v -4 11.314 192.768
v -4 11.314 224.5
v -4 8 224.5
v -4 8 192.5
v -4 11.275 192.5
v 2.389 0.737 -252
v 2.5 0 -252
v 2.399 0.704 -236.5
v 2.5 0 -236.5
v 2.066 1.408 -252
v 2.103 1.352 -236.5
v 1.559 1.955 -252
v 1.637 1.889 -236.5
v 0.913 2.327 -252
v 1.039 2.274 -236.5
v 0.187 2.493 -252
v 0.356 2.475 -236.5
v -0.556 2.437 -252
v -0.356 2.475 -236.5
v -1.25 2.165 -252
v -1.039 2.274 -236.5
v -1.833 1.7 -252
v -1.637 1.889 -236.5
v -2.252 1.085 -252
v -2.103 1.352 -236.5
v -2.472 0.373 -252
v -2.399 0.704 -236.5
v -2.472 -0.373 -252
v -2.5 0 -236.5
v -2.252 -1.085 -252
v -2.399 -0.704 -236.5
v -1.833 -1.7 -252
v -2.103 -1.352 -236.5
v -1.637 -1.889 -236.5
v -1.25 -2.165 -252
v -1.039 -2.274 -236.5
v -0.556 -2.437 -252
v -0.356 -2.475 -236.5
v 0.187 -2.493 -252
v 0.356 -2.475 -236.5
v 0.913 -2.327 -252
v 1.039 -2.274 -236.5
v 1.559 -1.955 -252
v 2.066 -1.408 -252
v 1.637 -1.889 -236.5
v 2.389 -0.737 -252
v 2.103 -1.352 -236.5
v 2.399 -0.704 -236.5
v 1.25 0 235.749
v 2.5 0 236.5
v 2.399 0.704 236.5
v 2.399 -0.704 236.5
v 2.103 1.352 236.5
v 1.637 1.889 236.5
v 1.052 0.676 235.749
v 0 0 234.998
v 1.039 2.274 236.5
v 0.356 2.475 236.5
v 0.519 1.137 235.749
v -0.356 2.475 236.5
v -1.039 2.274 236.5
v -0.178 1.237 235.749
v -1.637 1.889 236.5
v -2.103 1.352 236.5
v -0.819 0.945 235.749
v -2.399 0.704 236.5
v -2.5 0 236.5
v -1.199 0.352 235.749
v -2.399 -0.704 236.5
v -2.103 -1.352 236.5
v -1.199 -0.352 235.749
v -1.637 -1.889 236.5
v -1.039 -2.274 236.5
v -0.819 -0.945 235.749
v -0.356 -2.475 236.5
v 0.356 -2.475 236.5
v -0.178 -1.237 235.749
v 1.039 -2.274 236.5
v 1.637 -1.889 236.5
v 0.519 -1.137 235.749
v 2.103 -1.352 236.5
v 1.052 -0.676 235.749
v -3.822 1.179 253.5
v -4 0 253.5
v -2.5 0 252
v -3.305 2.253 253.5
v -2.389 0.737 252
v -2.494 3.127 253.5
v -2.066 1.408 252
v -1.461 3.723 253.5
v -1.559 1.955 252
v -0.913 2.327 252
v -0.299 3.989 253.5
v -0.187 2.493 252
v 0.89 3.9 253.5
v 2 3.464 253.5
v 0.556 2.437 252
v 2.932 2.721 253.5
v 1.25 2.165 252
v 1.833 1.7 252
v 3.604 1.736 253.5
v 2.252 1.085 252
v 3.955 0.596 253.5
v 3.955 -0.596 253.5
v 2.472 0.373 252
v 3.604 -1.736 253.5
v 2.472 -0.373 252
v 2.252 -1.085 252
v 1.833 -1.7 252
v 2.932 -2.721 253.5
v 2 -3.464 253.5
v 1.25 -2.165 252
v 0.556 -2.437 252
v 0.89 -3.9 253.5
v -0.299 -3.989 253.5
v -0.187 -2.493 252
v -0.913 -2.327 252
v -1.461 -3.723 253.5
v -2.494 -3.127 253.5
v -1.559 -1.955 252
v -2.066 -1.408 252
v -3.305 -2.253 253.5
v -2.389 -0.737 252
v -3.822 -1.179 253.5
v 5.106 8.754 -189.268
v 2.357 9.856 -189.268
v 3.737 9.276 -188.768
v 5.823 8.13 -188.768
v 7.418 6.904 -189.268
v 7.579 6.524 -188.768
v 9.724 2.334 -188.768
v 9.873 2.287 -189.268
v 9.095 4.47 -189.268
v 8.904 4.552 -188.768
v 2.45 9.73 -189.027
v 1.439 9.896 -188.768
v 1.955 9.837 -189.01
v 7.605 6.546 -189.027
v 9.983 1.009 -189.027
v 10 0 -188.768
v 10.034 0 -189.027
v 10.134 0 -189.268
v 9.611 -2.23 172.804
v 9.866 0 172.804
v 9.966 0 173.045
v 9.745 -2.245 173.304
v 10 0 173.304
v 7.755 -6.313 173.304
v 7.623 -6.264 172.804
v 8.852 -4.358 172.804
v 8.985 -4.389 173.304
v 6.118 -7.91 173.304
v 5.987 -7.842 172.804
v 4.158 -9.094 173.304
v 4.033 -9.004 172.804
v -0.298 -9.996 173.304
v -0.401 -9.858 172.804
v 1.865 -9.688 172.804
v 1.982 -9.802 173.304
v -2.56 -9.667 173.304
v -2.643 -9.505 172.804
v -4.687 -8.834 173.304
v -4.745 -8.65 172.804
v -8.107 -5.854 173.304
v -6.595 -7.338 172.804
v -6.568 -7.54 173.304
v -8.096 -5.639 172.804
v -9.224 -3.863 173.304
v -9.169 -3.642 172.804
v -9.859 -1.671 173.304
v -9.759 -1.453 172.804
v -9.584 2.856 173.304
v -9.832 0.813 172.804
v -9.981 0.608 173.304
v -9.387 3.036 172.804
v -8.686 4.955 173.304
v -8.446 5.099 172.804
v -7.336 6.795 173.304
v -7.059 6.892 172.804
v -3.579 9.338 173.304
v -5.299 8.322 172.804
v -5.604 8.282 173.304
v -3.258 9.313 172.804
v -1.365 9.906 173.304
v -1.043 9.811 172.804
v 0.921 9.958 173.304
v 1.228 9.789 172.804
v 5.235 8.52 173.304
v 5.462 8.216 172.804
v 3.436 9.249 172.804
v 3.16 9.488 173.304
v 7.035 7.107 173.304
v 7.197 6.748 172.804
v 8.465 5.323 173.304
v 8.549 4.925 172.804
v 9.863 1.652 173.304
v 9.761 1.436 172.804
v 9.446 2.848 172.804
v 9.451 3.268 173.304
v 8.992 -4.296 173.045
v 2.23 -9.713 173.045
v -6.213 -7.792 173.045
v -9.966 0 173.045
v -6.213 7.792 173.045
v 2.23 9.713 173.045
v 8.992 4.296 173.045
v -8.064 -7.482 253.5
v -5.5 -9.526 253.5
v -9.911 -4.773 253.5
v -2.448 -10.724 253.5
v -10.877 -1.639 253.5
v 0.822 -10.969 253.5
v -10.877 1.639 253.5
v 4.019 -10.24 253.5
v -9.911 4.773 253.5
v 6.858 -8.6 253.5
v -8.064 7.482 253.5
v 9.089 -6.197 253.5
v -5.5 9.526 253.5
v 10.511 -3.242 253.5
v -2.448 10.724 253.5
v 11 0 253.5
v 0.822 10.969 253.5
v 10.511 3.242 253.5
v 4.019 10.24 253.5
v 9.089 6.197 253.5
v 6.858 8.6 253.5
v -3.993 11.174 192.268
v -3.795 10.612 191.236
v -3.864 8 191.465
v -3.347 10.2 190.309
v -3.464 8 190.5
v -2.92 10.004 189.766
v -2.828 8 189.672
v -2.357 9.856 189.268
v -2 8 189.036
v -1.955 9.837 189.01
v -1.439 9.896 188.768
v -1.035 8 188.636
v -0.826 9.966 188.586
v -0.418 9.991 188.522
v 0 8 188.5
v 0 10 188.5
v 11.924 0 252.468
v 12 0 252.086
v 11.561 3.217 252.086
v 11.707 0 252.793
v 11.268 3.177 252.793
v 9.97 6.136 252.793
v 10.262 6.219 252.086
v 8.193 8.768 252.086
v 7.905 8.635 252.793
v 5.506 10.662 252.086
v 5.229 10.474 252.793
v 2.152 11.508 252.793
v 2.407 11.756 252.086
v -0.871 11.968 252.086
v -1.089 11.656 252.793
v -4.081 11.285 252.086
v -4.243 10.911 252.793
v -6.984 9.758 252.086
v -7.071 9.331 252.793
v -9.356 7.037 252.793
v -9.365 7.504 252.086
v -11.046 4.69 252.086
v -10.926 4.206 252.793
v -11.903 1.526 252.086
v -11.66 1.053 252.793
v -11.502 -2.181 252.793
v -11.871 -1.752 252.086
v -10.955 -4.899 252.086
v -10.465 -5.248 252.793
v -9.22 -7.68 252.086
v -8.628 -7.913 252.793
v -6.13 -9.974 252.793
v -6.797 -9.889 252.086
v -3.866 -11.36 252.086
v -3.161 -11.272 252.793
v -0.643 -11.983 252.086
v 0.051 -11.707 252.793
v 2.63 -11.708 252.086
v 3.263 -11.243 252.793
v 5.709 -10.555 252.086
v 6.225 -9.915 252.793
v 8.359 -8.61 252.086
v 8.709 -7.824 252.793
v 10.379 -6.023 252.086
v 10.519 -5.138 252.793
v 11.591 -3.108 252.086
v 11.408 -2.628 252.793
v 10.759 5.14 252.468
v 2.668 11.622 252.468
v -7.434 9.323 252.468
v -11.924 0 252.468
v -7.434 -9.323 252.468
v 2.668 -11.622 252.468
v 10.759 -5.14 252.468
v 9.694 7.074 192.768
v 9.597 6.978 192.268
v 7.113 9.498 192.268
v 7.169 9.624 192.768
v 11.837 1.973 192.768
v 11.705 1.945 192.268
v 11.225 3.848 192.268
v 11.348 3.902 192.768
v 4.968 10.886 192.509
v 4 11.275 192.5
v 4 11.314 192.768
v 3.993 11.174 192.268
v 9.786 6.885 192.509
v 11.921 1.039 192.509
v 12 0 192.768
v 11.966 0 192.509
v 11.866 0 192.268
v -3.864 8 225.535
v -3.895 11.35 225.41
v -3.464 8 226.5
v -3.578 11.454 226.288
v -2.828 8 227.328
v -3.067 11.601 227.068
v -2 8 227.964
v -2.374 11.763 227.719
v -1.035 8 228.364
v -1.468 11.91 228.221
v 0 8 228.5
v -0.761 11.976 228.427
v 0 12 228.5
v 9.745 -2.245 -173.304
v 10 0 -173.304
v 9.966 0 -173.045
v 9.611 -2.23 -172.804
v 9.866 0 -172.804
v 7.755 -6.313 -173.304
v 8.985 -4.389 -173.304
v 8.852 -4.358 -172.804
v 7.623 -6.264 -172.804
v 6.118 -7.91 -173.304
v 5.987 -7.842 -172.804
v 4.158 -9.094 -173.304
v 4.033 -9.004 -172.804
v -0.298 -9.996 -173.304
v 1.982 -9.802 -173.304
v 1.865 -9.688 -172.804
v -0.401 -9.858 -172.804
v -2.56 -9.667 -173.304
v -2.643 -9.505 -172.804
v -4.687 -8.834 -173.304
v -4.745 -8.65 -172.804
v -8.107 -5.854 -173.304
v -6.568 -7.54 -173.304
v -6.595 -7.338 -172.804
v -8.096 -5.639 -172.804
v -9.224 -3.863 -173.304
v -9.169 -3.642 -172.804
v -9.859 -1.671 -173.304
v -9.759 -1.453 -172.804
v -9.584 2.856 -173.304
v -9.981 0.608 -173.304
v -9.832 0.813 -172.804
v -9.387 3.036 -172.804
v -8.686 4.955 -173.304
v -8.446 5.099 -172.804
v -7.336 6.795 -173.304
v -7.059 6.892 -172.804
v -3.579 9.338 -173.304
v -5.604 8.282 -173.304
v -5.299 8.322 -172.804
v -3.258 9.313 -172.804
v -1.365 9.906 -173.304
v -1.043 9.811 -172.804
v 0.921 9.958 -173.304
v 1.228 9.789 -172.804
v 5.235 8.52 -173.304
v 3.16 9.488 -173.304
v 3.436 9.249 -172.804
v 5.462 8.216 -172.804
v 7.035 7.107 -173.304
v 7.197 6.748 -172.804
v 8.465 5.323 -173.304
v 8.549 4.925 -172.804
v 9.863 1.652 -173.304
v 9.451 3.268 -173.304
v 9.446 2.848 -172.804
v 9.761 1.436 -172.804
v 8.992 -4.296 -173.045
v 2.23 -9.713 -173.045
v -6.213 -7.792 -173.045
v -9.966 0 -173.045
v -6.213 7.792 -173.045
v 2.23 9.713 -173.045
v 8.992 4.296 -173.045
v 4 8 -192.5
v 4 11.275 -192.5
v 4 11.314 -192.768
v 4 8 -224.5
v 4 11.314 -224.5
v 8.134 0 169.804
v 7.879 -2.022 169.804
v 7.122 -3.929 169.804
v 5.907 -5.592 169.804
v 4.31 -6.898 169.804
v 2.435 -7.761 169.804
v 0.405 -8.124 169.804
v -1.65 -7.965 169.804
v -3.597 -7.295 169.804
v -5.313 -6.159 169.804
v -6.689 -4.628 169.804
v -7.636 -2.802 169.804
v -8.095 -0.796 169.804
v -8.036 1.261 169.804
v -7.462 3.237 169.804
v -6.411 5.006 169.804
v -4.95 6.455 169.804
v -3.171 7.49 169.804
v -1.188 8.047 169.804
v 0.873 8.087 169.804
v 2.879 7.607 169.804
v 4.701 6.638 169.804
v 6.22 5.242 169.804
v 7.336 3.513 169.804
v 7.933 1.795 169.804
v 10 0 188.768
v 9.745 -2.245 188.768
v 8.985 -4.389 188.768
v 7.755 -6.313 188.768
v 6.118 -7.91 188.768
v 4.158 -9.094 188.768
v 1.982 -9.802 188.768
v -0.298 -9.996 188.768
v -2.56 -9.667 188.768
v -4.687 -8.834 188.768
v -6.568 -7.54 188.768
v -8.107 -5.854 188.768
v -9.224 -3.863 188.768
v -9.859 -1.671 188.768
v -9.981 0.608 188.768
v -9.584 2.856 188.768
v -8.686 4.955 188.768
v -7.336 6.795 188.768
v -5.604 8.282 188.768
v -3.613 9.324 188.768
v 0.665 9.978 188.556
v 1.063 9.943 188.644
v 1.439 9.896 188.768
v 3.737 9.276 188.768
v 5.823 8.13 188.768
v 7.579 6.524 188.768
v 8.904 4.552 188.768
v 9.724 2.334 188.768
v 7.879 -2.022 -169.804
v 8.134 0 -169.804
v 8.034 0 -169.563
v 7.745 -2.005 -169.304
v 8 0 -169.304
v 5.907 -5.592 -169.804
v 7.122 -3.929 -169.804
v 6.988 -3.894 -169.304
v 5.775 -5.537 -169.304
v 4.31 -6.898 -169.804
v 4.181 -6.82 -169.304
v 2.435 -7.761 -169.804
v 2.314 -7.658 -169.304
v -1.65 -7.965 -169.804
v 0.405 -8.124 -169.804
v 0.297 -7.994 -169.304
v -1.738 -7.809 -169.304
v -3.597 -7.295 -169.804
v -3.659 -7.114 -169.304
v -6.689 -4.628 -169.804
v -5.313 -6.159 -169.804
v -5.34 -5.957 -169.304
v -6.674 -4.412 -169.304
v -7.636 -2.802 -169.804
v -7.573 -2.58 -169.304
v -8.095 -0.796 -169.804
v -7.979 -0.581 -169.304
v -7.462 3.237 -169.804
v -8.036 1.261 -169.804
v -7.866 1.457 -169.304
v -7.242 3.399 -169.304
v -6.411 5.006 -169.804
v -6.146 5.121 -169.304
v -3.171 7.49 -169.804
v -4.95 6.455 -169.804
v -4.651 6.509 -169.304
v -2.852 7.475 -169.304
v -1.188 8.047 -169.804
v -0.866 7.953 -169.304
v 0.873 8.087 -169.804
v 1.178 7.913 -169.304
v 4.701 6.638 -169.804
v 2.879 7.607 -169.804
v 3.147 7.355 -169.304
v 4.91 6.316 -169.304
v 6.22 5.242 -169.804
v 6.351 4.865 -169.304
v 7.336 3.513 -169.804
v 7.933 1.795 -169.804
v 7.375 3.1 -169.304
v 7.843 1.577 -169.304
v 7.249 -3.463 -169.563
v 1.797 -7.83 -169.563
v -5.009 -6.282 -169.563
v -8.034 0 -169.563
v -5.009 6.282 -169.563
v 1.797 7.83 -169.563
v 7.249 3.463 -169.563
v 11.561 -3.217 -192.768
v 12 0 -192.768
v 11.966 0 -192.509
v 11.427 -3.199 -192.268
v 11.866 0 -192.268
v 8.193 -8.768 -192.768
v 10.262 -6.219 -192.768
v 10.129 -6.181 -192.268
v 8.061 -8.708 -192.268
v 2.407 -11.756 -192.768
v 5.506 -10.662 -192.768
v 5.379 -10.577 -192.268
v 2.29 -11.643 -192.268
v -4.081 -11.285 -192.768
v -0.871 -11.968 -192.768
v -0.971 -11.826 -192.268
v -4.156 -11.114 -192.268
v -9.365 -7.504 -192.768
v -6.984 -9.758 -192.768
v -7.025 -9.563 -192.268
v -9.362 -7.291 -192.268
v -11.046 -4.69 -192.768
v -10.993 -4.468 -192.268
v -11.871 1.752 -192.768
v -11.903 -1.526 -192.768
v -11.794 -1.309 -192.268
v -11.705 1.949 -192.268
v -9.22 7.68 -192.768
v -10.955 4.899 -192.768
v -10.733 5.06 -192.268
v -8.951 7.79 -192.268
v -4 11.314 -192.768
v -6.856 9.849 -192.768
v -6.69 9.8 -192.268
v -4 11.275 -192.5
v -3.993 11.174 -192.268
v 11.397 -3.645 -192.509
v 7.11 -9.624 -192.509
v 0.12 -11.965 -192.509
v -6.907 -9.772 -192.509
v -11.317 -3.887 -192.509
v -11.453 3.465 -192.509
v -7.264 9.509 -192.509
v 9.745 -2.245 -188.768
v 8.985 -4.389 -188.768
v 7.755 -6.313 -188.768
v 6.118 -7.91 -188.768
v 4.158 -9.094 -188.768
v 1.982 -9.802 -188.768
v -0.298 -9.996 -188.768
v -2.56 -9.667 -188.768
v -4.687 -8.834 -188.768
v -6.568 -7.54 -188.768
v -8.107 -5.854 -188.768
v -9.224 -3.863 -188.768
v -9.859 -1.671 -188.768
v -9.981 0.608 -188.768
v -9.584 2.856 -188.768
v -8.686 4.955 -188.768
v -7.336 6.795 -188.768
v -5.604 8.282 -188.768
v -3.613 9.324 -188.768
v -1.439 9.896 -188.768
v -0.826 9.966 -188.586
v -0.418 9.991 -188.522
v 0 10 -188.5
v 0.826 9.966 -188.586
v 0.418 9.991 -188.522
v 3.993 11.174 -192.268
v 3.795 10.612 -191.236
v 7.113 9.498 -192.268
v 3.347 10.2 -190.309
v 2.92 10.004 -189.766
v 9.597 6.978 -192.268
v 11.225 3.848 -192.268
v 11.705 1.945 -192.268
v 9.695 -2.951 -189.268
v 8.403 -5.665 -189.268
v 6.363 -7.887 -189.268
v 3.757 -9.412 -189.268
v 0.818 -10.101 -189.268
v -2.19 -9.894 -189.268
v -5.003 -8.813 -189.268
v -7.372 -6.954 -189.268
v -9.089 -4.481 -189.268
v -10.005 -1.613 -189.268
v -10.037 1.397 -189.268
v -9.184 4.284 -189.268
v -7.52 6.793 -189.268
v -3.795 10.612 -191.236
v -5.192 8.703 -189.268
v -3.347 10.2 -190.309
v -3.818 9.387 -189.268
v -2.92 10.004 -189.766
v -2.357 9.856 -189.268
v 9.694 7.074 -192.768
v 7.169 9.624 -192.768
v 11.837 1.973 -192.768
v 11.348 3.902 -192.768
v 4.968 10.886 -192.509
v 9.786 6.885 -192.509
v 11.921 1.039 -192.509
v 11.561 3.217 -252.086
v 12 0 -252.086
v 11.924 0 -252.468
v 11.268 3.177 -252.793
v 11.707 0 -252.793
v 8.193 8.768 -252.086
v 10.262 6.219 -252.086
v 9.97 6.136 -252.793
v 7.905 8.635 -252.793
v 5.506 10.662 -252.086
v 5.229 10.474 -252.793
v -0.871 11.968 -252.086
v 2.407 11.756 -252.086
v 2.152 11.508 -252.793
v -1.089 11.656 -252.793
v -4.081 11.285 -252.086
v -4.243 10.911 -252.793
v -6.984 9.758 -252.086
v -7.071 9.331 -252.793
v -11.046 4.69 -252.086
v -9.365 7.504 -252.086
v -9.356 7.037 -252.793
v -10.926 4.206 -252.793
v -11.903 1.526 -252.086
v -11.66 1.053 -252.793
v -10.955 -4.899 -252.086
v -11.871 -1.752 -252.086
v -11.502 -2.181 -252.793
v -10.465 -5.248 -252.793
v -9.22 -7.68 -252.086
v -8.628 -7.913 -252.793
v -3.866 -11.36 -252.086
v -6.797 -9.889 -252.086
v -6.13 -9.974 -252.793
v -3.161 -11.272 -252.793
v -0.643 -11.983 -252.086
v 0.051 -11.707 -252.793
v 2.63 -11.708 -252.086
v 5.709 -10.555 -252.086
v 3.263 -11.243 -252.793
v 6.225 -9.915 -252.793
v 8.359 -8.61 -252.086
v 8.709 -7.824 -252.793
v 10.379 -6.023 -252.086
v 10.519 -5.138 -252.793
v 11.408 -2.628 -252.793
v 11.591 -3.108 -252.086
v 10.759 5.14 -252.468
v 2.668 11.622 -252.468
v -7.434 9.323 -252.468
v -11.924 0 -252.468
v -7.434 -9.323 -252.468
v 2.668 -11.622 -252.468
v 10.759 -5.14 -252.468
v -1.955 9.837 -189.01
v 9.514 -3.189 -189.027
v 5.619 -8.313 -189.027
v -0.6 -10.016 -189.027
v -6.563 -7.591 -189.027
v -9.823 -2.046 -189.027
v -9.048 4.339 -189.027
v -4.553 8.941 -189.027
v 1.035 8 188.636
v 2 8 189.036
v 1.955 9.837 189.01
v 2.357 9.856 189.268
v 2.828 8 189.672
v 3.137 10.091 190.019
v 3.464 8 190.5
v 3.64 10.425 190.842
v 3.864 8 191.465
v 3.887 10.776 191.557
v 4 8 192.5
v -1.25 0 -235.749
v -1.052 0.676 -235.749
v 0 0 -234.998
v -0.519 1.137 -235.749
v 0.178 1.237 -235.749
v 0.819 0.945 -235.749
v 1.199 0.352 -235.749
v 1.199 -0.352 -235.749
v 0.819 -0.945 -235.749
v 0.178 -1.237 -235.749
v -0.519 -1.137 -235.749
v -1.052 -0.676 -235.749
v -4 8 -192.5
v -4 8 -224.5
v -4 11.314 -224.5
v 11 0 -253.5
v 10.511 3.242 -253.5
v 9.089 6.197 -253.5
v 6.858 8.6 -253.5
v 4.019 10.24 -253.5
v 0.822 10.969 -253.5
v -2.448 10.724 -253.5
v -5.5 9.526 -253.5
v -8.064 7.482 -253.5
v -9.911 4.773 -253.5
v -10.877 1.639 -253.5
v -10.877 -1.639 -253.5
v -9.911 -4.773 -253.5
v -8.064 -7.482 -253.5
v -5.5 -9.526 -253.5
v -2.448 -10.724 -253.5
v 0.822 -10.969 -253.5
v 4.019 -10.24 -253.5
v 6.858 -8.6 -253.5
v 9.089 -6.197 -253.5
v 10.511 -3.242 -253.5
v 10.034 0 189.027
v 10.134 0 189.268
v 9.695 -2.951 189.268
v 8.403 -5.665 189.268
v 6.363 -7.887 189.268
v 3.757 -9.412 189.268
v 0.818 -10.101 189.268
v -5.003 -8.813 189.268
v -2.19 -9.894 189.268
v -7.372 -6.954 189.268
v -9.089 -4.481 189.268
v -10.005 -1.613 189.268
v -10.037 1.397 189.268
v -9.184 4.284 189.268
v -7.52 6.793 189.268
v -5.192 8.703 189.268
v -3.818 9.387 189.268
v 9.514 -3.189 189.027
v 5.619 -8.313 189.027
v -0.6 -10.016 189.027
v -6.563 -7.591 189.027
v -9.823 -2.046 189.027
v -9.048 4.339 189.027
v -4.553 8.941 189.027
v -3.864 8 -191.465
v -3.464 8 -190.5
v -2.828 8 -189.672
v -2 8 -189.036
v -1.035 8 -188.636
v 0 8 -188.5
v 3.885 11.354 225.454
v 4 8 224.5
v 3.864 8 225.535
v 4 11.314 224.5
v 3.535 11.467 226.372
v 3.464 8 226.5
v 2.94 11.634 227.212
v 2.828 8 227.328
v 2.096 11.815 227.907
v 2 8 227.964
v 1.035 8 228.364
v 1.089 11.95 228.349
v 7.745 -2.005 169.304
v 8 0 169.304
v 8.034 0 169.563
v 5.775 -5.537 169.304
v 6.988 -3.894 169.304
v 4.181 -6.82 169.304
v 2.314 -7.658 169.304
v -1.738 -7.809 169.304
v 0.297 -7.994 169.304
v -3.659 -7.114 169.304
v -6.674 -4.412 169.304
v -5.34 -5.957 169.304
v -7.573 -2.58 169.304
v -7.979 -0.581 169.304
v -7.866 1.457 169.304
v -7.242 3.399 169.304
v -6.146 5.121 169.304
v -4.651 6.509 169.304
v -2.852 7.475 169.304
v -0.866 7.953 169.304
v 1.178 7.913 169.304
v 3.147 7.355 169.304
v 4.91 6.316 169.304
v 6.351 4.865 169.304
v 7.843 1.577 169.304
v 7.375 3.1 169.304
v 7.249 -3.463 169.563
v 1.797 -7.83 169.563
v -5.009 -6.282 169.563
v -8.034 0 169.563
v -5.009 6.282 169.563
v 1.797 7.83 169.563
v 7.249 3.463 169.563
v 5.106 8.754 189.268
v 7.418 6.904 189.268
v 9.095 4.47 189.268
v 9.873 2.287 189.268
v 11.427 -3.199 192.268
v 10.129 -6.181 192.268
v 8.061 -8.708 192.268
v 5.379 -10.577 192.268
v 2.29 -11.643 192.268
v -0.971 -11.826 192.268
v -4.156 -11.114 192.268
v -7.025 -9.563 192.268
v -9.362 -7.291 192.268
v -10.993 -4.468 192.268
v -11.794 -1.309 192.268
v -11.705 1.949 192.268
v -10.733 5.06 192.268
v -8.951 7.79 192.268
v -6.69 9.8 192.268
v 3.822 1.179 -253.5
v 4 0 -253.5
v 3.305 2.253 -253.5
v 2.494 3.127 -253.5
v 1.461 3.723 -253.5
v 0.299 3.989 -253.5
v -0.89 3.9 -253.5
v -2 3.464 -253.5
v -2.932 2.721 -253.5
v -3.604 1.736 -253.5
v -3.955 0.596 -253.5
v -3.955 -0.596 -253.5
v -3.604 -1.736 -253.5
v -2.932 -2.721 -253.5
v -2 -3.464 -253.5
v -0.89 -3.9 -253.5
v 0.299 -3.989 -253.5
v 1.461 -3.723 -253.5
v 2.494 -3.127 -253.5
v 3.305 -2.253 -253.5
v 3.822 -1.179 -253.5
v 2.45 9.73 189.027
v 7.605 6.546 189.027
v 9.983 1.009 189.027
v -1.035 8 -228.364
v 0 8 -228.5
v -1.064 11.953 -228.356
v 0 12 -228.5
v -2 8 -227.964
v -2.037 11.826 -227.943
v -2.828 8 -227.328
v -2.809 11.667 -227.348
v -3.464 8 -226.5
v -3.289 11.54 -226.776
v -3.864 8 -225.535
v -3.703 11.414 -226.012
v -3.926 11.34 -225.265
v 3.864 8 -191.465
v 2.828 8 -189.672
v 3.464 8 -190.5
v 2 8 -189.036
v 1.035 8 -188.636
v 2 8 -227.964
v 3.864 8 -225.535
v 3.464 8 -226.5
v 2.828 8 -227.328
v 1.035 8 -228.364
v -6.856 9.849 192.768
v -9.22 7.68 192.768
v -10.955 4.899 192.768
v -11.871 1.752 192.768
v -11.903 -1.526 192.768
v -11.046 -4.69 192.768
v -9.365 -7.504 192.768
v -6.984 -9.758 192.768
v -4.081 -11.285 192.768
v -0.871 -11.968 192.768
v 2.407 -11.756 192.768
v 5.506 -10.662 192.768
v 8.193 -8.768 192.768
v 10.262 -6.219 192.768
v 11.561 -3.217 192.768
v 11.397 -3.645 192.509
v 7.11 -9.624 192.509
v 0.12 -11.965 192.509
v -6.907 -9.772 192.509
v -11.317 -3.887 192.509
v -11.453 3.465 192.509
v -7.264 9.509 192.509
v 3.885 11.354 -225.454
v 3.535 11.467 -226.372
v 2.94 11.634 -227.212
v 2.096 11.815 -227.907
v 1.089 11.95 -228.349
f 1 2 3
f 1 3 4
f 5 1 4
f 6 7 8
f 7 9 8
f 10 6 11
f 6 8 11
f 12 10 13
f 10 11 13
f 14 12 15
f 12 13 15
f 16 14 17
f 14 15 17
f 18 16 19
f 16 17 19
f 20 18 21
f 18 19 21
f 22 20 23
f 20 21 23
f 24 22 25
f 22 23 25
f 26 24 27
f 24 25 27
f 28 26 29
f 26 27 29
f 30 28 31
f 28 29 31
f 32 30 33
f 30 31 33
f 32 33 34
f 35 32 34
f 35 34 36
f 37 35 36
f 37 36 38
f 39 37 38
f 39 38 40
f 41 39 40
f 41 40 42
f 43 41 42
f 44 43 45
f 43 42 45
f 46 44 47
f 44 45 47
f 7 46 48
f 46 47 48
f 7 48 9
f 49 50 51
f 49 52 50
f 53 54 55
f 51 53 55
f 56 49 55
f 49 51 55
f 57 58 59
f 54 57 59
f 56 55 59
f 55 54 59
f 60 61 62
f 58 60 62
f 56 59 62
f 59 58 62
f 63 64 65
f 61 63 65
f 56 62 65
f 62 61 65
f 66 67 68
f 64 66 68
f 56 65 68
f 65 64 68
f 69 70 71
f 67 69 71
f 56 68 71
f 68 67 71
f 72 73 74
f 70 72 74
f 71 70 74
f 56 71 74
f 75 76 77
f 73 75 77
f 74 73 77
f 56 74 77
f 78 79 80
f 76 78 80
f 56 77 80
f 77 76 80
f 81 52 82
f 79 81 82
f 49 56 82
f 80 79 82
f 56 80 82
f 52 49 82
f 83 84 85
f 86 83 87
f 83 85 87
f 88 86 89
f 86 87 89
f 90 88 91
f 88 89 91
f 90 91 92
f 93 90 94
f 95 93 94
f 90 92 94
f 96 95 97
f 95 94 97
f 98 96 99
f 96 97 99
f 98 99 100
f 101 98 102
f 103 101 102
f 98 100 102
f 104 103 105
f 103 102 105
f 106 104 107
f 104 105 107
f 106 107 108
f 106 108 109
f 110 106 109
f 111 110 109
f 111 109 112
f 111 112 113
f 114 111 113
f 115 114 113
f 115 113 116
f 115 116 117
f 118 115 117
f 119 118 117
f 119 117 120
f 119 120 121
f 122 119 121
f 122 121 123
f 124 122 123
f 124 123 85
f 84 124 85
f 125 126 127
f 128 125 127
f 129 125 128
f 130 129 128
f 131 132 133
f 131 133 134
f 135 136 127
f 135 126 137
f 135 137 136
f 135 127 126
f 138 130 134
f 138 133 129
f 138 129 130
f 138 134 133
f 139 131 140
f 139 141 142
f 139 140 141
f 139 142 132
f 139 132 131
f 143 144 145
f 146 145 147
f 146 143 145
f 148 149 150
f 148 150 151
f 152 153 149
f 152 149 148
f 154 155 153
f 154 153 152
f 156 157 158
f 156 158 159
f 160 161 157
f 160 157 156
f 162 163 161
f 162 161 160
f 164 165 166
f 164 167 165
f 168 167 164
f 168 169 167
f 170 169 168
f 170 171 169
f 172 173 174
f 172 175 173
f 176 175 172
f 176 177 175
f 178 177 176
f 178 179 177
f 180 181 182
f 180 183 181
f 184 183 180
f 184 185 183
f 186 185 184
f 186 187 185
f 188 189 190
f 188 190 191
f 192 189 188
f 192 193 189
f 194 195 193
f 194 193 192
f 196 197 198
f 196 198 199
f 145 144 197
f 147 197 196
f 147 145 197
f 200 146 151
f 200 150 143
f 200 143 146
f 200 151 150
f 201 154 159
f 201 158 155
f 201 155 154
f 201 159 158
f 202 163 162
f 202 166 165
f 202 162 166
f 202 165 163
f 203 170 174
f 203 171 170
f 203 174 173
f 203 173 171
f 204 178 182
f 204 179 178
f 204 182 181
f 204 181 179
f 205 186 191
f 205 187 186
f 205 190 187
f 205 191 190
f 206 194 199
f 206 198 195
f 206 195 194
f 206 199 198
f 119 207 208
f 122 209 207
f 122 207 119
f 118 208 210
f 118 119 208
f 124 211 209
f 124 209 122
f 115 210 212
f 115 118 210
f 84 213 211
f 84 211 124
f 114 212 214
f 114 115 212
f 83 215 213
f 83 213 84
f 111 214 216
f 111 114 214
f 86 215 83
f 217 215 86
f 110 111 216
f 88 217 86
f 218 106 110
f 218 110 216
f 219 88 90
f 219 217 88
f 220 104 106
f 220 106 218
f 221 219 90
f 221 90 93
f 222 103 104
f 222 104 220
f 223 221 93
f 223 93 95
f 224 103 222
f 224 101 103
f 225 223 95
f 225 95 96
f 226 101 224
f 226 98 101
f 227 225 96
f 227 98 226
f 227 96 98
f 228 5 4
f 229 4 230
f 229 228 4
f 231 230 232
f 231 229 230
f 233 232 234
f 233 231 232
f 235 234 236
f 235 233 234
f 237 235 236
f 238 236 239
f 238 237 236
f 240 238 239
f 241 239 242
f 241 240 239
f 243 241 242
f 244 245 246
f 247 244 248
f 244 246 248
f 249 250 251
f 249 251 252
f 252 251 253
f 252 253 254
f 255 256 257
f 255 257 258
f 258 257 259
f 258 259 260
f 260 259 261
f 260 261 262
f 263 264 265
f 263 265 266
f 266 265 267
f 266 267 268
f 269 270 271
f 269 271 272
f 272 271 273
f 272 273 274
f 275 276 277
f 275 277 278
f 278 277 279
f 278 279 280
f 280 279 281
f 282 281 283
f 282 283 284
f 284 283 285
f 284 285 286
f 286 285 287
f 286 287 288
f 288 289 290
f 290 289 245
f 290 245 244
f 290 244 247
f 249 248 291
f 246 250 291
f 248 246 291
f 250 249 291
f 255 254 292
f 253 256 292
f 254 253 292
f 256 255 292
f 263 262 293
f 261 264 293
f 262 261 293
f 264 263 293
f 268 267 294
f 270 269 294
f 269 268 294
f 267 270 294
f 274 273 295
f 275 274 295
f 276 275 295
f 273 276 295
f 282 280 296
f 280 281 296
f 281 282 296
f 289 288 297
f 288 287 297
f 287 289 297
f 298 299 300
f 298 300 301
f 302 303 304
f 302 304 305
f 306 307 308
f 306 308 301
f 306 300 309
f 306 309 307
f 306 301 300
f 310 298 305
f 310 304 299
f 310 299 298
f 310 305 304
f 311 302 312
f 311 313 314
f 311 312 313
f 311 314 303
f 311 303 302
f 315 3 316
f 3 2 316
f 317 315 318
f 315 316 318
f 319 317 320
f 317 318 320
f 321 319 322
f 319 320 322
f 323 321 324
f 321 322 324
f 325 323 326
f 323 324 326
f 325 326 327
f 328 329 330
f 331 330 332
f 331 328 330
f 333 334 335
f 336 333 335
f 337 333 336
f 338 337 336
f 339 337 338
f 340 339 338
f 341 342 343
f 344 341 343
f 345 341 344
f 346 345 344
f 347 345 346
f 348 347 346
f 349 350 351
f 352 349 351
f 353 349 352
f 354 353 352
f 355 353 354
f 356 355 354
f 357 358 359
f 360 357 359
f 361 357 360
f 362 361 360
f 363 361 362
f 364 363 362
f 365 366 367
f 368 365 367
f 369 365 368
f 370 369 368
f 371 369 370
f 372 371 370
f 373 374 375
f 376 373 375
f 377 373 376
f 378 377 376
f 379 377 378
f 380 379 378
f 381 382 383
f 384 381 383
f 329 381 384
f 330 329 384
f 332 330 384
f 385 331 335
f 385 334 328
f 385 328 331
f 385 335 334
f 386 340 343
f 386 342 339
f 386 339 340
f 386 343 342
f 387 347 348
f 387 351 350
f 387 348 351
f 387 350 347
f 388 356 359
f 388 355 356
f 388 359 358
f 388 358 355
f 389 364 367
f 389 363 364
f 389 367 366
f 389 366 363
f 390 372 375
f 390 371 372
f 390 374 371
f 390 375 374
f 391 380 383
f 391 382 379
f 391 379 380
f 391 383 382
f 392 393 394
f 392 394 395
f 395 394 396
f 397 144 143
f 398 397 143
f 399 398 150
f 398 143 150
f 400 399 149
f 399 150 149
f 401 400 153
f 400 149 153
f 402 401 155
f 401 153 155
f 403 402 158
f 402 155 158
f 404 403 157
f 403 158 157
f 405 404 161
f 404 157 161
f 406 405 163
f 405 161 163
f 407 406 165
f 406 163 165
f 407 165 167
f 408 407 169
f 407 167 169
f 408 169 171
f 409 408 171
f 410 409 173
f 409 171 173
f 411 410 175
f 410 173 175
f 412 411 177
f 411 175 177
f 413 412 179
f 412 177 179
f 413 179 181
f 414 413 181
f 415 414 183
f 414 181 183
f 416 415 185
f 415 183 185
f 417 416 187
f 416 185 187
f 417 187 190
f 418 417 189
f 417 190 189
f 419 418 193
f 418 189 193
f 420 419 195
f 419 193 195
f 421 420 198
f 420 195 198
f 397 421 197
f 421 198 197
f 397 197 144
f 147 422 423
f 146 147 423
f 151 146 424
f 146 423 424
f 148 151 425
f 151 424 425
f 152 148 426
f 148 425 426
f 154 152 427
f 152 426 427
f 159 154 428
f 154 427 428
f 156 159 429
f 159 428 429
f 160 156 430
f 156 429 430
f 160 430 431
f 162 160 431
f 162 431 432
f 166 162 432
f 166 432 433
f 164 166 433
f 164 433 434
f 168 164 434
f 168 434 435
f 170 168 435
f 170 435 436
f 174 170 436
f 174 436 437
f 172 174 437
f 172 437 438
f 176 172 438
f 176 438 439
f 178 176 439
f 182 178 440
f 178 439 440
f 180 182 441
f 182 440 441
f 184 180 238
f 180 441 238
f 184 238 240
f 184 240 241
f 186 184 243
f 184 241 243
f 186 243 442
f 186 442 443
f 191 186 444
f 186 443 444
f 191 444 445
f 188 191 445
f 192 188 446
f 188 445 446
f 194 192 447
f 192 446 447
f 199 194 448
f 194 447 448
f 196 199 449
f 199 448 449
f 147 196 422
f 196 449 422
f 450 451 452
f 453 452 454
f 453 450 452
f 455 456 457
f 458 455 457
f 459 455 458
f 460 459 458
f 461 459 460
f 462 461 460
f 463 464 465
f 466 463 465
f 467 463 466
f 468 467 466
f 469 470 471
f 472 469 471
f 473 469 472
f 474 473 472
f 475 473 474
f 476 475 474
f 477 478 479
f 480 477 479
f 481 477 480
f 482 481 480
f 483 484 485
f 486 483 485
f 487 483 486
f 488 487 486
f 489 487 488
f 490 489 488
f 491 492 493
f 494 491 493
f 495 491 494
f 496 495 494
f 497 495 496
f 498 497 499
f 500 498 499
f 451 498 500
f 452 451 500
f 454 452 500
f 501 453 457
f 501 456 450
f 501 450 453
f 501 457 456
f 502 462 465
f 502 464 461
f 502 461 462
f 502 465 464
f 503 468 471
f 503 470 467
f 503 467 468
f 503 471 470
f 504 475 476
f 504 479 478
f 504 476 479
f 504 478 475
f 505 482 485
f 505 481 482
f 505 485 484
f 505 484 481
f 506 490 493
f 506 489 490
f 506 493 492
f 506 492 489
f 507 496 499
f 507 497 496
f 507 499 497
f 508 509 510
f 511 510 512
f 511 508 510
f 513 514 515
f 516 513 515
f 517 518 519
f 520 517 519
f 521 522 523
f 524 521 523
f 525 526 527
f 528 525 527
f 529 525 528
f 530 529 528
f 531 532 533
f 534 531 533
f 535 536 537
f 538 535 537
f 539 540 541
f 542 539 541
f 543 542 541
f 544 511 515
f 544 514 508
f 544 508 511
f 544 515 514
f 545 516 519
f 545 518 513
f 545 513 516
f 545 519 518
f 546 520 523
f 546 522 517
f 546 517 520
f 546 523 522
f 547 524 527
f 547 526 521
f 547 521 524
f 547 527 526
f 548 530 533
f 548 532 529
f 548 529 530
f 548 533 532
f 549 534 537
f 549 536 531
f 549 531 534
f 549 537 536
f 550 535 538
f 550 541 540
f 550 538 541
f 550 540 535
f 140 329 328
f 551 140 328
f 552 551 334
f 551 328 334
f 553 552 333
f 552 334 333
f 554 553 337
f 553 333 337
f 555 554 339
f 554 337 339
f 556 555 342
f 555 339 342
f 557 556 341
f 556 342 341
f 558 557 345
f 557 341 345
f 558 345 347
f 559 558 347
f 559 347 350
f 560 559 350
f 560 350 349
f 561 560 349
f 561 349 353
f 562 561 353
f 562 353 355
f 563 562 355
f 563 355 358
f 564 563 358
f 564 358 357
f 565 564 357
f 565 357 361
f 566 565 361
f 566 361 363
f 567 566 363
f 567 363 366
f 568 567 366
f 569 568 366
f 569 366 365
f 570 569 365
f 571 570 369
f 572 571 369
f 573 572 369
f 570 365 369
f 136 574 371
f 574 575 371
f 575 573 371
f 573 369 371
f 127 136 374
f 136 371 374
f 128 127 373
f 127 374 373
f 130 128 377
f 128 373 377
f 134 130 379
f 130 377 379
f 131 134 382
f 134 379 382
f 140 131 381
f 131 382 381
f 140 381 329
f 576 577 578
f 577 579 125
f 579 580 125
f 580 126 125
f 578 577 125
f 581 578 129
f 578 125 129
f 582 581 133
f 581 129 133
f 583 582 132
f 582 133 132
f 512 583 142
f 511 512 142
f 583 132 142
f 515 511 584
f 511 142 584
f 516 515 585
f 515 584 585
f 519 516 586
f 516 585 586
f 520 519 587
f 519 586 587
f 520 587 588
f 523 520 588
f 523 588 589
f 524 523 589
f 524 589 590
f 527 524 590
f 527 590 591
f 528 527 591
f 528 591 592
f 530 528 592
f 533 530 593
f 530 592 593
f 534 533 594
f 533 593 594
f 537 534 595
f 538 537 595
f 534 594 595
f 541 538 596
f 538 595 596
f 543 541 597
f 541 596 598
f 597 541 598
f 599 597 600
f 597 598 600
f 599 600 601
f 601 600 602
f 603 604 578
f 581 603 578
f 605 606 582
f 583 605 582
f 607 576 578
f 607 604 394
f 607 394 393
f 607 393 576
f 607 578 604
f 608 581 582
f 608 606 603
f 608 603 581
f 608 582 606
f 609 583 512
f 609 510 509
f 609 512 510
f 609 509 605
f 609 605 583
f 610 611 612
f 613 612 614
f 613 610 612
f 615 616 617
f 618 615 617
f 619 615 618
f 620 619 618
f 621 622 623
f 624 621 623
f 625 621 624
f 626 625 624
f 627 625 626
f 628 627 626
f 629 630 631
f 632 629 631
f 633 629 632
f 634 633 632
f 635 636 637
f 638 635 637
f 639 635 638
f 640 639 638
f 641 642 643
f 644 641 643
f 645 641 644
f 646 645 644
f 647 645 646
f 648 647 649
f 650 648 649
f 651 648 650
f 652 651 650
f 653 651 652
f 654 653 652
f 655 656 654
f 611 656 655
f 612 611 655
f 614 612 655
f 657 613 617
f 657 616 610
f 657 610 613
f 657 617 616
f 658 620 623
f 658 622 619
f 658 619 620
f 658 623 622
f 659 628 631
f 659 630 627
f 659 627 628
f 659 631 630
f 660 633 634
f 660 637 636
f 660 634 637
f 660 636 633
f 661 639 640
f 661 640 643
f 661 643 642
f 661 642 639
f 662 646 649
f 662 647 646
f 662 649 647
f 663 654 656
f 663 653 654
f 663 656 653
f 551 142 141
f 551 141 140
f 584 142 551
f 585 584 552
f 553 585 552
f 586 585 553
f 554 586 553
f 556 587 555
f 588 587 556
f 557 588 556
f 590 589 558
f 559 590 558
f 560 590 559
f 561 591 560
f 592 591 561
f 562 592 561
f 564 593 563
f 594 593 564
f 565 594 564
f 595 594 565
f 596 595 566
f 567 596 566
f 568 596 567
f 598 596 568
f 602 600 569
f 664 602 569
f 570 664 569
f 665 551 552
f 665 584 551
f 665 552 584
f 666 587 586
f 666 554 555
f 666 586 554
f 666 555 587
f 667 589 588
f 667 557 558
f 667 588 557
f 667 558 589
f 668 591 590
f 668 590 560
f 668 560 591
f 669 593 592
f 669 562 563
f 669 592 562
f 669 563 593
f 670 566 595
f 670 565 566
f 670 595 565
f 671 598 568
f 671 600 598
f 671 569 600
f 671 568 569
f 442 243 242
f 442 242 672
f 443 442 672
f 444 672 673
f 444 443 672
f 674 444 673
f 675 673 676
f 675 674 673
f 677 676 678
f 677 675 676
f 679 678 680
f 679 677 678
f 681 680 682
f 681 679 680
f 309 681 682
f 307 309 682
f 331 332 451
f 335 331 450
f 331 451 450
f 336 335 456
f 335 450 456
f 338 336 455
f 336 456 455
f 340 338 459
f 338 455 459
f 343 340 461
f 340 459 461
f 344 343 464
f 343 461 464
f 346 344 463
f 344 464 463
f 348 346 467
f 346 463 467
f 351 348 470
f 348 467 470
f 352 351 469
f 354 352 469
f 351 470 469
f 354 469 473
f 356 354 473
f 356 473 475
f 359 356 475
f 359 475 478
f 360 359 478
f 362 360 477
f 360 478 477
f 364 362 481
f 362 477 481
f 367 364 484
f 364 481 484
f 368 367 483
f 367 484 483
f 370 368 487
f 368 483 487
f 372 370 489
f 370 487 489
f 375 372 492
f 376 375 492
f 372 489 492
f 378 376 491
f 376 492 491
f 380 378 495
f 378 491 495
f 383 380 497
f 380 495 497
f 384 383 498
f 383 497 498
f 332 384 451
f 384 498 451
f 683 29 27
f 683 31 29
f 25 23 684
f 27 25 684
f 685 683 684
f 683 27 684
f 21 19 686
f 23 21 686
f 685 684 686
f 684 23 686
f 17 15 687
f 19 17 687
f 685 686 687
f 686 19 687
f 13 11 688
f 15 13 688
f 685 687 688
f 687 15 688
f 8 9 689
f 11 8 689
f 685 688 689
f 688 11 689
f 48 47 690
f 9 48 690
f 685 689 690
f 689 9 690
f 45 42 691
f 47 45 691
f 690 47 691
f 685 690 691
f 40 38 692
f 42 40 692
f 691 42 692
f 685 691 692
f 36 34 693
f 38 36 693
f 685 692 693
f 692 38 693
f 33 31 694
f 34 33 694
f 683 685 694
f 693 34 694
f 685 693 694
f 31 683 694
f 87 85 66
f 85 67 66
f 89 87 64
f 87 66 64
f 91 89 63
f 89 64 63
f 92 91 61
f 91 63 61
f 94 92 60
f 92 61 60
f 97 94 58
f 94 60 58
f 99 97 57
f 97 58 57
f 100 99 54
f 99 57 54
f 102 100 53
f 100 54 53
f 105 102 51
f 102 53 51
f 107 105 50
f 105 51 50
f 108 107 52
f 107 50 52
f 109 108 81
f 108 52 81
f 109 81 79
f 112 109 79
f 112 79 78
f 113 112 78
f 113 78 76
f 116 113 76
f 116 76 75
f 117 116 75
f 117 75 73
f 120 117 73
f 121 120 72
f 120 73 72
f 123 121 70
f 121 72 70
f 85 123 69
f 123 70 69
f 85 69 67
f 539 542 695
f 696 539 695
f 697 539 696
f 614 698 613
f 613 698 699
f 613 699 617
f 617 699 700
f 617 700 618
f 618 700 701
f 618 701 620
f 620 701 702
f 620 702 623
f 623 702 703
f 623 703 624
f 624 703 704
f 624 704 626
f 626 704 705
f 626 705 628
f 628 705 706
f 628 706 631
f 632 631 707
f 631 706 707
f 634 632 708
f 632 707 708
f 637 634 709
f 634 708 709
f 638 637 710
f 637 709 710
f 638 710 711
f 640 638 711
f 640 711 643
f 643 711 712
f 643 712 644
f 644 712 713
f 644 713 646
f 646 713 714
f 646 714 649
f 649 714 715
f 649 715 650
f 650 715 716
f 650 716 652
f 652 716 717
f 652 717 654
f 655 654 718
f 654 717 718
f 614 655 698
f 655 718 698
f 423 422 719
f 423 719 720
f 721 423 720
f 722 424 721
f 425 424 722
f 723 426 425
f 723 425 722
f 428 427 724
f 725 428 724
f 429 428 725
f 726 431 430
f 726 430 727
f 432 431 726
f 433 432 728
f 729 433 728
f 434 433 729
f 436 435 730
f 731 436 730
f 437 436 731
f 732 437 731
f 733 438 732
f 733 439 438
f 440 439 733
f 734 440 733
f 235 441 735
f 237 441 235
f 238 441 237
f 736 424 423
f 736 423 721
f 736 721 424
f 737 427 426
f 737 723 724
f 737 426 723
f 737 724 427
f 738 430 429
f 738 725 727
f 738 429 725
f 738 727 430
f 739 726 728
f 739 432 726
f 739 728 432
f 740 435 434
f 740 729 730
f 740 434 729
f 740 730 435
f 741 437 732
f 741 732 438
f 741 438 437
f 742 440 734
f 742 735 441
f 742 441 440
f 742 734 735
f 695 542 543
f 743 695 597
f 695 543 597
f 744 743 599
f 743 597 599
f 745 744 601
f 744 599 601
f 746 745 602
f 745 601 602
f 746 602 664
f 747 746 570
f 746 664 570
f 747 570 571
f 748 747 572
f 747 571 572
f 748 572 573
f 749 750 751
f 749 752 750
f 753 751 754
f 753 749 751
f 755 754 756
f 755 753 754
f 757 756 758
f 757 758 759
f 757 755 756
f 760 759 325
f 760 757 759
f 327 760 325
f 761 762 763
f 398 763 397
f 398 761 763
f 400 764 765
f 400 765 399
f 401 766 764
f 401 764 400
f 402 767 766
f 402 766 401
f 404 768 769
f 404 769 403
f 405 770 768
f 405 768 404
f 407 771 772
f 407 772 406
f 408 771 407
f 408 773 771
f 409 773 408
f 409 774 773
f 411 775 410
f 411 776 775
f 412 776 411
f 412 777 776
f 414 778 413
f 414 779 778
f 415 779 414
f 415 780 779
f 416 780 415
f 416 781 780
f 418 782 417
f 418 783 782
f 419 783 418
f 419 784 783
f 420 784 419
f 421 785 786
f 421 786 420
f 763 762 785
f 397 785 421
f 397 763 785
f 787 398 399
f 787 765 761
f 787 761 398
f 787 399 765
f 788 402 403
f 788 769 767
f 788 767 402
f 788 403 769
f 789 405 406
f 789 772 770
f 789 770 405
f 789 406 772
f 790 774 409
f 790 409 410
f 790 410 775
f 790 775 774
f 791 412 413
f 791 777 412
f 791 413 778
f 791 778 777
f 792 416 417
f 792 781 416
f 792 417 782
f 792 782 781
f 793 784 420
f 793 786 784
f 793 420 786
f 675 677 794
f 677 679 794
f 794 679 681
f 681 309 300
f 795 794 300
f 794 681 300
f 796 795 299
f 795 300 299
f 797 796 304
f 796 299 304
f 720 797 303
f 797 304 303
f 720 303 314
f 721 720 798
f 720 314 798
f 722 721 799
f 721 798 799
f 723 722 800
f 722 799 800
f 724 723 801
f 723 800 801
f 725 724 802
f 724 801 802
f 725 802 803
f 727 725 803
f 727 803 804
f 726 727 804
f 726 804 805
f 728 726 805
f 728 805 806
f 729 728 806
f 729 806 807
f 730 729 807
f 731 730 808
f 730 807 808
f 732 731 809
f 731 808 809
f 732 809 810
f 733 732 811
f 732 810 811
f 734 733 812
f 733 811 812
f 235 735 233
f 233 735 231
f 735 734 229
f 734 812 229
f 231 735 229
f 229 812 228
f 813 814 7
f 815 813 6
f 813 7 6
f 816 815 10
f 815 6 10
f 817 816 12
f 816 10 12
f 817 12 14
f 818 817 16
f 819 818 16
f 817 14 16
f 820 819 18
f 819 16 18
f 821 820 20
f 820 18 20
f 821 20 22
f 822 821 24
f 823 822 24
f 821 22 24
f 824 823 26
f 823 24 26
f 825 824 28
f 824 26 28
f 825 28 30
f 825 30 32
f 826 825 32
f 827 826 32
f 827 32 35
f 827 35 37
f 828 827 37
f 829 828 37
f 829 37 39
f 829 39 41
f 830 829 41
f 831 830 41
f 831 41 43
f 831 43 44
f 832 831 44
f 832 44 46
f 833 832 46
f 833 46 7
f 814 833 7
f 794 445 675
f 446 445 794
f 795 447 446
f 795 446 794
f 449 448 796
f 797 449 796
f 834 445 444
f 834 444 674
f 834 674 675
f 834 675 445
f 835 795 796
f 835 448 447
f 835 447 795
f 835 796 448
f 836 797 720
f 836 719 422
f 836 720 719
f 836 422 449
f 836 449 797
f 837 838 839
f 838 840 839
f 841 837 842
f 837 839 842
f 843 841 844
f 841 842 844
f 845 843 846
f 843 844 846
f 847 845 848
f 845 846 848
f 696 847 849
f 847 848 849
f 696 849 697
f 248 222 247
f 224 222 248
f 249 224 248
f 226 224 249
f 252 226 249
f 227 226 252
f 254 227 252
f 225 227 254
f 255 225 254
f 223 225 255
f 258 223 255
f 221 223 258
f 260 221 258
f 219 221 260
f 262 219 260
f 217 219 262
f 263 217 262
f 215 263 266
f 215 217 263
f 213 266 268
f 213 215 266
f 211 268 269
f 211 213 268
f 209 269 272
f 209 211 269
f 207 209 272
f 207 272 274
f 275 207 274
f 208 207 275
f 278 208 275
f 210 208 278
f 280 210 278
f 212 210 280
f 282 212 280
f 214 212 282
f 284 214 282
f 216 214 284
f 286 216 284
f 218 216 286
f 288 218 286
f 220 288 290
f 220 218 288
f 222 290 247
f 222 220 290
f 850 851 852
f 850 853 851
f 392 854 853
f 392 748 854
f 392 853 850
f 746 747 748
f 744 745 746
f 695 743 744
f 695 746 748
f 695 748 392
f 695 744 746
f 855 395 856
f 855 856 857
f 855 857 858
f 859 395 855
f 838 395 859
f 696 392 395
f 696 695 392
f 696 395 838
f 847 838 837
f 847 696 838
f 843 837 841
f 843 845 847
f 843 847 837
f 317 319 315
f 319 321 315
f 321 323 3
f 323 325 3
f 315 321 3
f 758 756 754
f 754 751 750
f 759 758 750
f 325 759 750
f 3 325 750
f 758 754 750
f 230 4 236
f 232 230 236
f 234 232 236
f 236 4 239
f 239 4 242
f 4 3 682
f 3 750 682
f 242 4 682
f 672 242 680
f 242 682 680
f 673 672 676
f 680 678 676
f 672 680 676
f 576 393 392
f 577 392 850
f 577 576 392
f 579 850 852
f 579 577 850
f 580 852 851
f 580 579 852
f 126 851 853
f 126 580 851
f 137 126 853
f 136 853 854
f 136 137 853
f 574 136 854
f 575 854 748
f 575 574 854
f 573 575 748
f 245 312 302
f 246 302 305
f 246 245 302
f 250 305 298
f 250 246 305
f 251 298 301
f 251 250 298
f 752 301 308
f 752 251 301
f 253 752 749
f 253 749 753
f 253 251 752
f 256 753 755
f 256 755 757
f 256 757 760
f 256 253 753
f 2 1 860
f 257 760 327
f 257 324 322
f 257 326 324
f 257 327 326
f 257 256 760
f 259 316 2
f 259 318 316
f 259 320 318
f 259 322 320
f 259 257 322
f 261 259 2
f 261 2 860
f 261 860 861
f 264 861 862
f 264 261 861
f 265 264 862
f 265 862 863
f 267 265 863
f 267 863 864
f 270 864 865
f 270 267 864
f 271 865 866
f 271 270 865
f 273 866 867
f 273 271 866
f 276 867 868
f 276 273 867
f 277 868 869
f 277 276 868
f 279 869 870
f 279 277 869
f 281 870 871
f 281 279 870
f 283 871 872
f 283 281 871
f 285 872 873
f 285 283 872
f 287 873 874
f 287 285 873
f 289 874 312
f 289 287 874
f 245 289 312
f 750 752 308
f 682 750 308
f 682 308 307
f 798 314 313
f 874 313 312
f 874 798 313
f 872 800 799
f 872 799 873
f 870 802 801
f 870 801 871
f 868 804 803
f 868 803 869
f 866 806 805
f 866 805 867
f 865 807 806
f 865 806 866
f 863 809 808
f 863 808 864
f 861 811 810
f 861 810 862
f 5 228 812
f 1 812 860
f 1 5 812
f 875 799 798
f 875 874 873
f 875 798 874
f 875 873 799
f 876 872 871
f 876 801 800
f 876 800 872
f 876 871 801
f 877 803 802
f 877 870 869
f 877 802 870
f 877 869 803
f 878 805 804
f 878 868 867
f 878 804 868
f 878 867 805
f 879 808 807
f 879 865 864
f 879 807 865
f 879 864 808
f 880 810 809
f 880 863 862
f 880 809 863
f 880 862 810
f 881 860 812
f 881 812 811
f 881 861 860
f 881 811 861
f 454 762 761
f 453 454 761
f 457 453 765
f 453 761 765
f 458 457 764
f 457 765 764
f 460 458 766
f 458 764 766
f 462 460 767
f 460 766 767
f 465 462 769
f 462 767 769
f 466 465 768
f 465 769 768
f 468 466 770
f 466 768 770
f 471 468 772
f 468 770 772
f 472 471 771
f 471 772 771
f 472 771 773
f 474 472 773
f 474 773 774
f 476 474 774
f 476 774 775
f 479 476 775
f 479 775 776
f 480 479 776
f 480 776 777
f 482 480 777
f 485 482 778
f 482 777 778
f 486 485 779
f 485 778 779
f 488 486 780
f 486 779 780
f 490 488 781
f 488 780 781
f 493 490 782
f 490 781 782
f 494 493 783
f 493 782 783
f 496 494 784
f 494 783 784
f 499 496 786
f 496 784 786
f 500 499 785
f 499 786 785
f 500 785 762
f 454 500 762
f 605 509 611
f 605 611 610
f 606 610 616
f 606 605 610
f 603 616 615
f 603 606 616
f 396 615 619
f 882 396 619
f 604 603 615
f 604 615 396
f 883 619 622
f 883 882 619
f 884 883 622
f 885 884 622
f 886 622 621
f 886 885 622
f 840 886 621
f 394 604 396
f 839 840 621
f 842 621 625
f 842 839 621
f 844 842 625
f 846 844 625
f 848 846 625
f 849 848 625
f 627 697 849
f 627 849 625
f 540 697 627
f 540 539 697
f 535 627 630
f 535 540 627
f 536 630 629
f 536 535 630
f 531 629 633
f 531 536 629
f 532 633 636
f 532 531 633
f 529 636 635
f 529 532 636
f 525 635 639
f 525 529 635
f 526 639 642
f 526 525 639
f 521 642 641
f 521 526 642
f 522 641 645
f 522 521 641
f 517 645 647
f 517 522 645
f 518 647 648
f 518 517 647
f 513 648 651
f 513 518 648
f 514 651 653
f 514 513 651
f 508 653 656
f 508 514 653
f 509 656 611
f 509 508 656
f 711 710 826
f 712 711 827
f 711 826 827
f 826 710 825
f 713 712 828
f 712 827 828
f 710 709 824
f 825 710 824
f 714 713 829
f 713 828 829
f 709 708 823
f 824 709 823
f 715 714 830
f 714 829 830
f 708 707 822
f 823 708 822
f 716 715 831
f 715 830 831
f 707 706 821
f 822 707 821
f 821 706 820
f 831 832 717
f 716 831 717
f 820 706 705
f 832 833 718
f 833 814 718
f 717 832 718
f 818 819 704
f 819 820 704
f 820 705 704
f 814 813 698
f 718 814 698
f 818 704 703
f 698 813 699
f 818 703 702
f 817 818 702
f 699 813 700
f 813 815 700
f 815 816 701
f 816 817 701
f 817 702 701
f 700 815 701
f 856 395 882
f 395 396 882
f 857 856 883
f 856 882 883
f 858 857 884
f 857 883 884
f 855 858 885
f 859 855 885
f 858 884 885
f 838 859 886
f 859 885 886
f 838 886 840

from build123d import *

# Parameters (mm, degrees)
SKETCH1_R                   = 12
BOSS_EXTRUDE1_DEPTH         = 253.5
CHAMFER1_SIZE               = 1
FILLET1_R                   = 1
SKETCH3_W                   = 40
SKETCH3_H                   = 8
CUT_EXTRUDE1_DEPTH          = 4
FILLET2_R                   = 4
M6_TAPPED_HOLE1_D           = 5
M6_TAPPED_HOLE1_DEPTH       = 17
M6_TAPPED_HOLE1_CSINK_D     = 8
M6_TAPPED_HOLE1_CSINK_ANGLE = 90
M6_TAPPED_HOLE1_TIP         = 1.502151548
M6_TAPPED_HOLE2_D           = 5
M6_TAPPED_HOLE2_DEPTH       = 17
M6_TAPPED_HOLE2_CSINK_D     = 8
M6_TAPPED_HOLE2_CSINK_ANGLE = 90
M6_TAPPED_HOLE2_TIP         = 1.502151548


with BuildPart() as part:
    # Sketch1 → Boss-Extrude1 (new, symmetric)
    with BuildSketch(Plane.XY):
        Circle(SKETCH1_R)
    extrude(amount=BOSS_EXTRUDE1_DEPTH, both=True)

    # Sketch2 → Cut-Revolve1 (revolve, cut)
    with BuildSketch(Plane(origin=(0, 0, 0), x_dir=(1, 0, 0), z_dir=(0, 1, 0)), mode=Mode.PRIVATE) as cut_revolve1_sk:
        Polygon((-10, 173.035898385), (-8, 169.57179677), (-8, -169.57179677), (-10, -173.035898385), (-10, -189.035898385), (-12, -192.5), (-12, -176.5), (-12, 176.5), (-12, 192.5), (-10, 189.035898385), align=None)
    revolve(cut_revolve1_sk.sketch.rotate(Axis((0, 0, 0), (0, 0, -1)), 180), axis=Axis((0, 0, 0), (0, 0, -1)), mode=Mode.SUBTRACT)

    # Chamfer1
    chamfer1_edges = [part.edges().sort_by_distance(p)[0] for p in [
        (-12, 0, -253.5),
        (-12, 0, 253.5),
    ]]
    chamfer(chamfer1_edges, length=CHAMFER1_SIZE)

    # Fillet1
    fillet1_edges = [part.edges().sort_by_distance(p)[0] for p in [
        (-12, 0, 252.5),
        (-12, 0, -252.5),
        (-10, 0, -189.035898385),
        (-10, 0, -173.035898385),
        (-8, 0, -169.57179677),
        (-8, 0, 169.57179677),
        (-10, 0, 173.035898385),
        (-10, 0, 189.035898385),
        (-12, 0, 192.5),
        (-12, 0, -192.5),
    ]]
    fillet(fillet1_edges, radius=FILLET1_R)

    # Sketch3 → Cut-Extrude1 (cut, symmetric)
    with BuildSketch(Plane(origin=(0, 0, 0), x_dir=(0, 0, -1), z_dir=(1, 0, 0))):
        with Locations((208.5, 12)):
            Rectangle(SKETCH3_W, SKETCH3_H)
        with Locations((-208.5, 12)):
            Rectangle(SKETCH3_W, SKETCH3_H)
    extrude(amount=CUT_EXTRUDE1_DEPTH, both=True, mode=Mode.SUBTRACT)

    # Fillet2
    fillet2_edges = [part.edges().sort_by_distance(p)[0] for p in [
        (-4, 8.582575695, 188.5),
        (4, 8.582575695, 188.5),
        (4, 9.656854249, 228.5),
        (-4, 9.656854249, 228.5),
        (-4, 8.582575695, -188.5),
        (4, 8.582575695, -188.5),
        (-4, 9.656854249, -228.5),
        (4, 9.656854249, -228.5),
    ]]
    fillet(fillet2_edges, radius=FILLET2_R - 0.0001)  # a hair under: the kernel refuses the full size

    # M6 Tapped Hole1
    with Locations(Plane(origin=(0, 0, -253.5), x_dir=(-1, 0, 0), z_dir=(0, 0, -1))):
        with Locations((0, 0)):
            CounterSinkHole(M6_TAPPED_HOLE1_D / 2, M6_TAPPED_HOLE1_CSINK_D / 2, depth=M6_TAPPED_HOLE1_DEPTH, counter_sink_angle=M6_TAPPED_HOLE1_CSINK_ANGLE)
            with Locations((0, 0, -(M6_TAPPED_HOLE1_DEPTH + M6_TAPPED_HOLE1_TIP / 2))):  # 118° drill point
                Cone(0, M6_TAPPED_HOLE1_D / 2, M6_TAPPED_HOLE1_TIP, mode=Mode.SUBTRACT)

    # M6 Tapped Hole2
    with Locations(Plane.XY.offset(253.5)):
        with Locations((0, 0)):
            CounterSinkHole(M6_TAPPED_HOLE2_D / 2, M6_TAPPED_HOLE2_CSINK_D / 2, depth=M6_TAPPED_HOLE2_DEPTH, counter_sink_angle=M6_TAPPED_HOLE2_CSINK_ANGLE)
            with Locations((0, 0, -(M6_TAPPED_HOLE2_DEPTH + M6_TAPPED_HOLE2_TIP / 2))):  # 118° drill point
                Cone(0, M6_TAPPED_HOLE2_D / 2, M6_TAPPED_HOLE2_TIP, mode=Mode.SUBTRACT)


solid = part.part
